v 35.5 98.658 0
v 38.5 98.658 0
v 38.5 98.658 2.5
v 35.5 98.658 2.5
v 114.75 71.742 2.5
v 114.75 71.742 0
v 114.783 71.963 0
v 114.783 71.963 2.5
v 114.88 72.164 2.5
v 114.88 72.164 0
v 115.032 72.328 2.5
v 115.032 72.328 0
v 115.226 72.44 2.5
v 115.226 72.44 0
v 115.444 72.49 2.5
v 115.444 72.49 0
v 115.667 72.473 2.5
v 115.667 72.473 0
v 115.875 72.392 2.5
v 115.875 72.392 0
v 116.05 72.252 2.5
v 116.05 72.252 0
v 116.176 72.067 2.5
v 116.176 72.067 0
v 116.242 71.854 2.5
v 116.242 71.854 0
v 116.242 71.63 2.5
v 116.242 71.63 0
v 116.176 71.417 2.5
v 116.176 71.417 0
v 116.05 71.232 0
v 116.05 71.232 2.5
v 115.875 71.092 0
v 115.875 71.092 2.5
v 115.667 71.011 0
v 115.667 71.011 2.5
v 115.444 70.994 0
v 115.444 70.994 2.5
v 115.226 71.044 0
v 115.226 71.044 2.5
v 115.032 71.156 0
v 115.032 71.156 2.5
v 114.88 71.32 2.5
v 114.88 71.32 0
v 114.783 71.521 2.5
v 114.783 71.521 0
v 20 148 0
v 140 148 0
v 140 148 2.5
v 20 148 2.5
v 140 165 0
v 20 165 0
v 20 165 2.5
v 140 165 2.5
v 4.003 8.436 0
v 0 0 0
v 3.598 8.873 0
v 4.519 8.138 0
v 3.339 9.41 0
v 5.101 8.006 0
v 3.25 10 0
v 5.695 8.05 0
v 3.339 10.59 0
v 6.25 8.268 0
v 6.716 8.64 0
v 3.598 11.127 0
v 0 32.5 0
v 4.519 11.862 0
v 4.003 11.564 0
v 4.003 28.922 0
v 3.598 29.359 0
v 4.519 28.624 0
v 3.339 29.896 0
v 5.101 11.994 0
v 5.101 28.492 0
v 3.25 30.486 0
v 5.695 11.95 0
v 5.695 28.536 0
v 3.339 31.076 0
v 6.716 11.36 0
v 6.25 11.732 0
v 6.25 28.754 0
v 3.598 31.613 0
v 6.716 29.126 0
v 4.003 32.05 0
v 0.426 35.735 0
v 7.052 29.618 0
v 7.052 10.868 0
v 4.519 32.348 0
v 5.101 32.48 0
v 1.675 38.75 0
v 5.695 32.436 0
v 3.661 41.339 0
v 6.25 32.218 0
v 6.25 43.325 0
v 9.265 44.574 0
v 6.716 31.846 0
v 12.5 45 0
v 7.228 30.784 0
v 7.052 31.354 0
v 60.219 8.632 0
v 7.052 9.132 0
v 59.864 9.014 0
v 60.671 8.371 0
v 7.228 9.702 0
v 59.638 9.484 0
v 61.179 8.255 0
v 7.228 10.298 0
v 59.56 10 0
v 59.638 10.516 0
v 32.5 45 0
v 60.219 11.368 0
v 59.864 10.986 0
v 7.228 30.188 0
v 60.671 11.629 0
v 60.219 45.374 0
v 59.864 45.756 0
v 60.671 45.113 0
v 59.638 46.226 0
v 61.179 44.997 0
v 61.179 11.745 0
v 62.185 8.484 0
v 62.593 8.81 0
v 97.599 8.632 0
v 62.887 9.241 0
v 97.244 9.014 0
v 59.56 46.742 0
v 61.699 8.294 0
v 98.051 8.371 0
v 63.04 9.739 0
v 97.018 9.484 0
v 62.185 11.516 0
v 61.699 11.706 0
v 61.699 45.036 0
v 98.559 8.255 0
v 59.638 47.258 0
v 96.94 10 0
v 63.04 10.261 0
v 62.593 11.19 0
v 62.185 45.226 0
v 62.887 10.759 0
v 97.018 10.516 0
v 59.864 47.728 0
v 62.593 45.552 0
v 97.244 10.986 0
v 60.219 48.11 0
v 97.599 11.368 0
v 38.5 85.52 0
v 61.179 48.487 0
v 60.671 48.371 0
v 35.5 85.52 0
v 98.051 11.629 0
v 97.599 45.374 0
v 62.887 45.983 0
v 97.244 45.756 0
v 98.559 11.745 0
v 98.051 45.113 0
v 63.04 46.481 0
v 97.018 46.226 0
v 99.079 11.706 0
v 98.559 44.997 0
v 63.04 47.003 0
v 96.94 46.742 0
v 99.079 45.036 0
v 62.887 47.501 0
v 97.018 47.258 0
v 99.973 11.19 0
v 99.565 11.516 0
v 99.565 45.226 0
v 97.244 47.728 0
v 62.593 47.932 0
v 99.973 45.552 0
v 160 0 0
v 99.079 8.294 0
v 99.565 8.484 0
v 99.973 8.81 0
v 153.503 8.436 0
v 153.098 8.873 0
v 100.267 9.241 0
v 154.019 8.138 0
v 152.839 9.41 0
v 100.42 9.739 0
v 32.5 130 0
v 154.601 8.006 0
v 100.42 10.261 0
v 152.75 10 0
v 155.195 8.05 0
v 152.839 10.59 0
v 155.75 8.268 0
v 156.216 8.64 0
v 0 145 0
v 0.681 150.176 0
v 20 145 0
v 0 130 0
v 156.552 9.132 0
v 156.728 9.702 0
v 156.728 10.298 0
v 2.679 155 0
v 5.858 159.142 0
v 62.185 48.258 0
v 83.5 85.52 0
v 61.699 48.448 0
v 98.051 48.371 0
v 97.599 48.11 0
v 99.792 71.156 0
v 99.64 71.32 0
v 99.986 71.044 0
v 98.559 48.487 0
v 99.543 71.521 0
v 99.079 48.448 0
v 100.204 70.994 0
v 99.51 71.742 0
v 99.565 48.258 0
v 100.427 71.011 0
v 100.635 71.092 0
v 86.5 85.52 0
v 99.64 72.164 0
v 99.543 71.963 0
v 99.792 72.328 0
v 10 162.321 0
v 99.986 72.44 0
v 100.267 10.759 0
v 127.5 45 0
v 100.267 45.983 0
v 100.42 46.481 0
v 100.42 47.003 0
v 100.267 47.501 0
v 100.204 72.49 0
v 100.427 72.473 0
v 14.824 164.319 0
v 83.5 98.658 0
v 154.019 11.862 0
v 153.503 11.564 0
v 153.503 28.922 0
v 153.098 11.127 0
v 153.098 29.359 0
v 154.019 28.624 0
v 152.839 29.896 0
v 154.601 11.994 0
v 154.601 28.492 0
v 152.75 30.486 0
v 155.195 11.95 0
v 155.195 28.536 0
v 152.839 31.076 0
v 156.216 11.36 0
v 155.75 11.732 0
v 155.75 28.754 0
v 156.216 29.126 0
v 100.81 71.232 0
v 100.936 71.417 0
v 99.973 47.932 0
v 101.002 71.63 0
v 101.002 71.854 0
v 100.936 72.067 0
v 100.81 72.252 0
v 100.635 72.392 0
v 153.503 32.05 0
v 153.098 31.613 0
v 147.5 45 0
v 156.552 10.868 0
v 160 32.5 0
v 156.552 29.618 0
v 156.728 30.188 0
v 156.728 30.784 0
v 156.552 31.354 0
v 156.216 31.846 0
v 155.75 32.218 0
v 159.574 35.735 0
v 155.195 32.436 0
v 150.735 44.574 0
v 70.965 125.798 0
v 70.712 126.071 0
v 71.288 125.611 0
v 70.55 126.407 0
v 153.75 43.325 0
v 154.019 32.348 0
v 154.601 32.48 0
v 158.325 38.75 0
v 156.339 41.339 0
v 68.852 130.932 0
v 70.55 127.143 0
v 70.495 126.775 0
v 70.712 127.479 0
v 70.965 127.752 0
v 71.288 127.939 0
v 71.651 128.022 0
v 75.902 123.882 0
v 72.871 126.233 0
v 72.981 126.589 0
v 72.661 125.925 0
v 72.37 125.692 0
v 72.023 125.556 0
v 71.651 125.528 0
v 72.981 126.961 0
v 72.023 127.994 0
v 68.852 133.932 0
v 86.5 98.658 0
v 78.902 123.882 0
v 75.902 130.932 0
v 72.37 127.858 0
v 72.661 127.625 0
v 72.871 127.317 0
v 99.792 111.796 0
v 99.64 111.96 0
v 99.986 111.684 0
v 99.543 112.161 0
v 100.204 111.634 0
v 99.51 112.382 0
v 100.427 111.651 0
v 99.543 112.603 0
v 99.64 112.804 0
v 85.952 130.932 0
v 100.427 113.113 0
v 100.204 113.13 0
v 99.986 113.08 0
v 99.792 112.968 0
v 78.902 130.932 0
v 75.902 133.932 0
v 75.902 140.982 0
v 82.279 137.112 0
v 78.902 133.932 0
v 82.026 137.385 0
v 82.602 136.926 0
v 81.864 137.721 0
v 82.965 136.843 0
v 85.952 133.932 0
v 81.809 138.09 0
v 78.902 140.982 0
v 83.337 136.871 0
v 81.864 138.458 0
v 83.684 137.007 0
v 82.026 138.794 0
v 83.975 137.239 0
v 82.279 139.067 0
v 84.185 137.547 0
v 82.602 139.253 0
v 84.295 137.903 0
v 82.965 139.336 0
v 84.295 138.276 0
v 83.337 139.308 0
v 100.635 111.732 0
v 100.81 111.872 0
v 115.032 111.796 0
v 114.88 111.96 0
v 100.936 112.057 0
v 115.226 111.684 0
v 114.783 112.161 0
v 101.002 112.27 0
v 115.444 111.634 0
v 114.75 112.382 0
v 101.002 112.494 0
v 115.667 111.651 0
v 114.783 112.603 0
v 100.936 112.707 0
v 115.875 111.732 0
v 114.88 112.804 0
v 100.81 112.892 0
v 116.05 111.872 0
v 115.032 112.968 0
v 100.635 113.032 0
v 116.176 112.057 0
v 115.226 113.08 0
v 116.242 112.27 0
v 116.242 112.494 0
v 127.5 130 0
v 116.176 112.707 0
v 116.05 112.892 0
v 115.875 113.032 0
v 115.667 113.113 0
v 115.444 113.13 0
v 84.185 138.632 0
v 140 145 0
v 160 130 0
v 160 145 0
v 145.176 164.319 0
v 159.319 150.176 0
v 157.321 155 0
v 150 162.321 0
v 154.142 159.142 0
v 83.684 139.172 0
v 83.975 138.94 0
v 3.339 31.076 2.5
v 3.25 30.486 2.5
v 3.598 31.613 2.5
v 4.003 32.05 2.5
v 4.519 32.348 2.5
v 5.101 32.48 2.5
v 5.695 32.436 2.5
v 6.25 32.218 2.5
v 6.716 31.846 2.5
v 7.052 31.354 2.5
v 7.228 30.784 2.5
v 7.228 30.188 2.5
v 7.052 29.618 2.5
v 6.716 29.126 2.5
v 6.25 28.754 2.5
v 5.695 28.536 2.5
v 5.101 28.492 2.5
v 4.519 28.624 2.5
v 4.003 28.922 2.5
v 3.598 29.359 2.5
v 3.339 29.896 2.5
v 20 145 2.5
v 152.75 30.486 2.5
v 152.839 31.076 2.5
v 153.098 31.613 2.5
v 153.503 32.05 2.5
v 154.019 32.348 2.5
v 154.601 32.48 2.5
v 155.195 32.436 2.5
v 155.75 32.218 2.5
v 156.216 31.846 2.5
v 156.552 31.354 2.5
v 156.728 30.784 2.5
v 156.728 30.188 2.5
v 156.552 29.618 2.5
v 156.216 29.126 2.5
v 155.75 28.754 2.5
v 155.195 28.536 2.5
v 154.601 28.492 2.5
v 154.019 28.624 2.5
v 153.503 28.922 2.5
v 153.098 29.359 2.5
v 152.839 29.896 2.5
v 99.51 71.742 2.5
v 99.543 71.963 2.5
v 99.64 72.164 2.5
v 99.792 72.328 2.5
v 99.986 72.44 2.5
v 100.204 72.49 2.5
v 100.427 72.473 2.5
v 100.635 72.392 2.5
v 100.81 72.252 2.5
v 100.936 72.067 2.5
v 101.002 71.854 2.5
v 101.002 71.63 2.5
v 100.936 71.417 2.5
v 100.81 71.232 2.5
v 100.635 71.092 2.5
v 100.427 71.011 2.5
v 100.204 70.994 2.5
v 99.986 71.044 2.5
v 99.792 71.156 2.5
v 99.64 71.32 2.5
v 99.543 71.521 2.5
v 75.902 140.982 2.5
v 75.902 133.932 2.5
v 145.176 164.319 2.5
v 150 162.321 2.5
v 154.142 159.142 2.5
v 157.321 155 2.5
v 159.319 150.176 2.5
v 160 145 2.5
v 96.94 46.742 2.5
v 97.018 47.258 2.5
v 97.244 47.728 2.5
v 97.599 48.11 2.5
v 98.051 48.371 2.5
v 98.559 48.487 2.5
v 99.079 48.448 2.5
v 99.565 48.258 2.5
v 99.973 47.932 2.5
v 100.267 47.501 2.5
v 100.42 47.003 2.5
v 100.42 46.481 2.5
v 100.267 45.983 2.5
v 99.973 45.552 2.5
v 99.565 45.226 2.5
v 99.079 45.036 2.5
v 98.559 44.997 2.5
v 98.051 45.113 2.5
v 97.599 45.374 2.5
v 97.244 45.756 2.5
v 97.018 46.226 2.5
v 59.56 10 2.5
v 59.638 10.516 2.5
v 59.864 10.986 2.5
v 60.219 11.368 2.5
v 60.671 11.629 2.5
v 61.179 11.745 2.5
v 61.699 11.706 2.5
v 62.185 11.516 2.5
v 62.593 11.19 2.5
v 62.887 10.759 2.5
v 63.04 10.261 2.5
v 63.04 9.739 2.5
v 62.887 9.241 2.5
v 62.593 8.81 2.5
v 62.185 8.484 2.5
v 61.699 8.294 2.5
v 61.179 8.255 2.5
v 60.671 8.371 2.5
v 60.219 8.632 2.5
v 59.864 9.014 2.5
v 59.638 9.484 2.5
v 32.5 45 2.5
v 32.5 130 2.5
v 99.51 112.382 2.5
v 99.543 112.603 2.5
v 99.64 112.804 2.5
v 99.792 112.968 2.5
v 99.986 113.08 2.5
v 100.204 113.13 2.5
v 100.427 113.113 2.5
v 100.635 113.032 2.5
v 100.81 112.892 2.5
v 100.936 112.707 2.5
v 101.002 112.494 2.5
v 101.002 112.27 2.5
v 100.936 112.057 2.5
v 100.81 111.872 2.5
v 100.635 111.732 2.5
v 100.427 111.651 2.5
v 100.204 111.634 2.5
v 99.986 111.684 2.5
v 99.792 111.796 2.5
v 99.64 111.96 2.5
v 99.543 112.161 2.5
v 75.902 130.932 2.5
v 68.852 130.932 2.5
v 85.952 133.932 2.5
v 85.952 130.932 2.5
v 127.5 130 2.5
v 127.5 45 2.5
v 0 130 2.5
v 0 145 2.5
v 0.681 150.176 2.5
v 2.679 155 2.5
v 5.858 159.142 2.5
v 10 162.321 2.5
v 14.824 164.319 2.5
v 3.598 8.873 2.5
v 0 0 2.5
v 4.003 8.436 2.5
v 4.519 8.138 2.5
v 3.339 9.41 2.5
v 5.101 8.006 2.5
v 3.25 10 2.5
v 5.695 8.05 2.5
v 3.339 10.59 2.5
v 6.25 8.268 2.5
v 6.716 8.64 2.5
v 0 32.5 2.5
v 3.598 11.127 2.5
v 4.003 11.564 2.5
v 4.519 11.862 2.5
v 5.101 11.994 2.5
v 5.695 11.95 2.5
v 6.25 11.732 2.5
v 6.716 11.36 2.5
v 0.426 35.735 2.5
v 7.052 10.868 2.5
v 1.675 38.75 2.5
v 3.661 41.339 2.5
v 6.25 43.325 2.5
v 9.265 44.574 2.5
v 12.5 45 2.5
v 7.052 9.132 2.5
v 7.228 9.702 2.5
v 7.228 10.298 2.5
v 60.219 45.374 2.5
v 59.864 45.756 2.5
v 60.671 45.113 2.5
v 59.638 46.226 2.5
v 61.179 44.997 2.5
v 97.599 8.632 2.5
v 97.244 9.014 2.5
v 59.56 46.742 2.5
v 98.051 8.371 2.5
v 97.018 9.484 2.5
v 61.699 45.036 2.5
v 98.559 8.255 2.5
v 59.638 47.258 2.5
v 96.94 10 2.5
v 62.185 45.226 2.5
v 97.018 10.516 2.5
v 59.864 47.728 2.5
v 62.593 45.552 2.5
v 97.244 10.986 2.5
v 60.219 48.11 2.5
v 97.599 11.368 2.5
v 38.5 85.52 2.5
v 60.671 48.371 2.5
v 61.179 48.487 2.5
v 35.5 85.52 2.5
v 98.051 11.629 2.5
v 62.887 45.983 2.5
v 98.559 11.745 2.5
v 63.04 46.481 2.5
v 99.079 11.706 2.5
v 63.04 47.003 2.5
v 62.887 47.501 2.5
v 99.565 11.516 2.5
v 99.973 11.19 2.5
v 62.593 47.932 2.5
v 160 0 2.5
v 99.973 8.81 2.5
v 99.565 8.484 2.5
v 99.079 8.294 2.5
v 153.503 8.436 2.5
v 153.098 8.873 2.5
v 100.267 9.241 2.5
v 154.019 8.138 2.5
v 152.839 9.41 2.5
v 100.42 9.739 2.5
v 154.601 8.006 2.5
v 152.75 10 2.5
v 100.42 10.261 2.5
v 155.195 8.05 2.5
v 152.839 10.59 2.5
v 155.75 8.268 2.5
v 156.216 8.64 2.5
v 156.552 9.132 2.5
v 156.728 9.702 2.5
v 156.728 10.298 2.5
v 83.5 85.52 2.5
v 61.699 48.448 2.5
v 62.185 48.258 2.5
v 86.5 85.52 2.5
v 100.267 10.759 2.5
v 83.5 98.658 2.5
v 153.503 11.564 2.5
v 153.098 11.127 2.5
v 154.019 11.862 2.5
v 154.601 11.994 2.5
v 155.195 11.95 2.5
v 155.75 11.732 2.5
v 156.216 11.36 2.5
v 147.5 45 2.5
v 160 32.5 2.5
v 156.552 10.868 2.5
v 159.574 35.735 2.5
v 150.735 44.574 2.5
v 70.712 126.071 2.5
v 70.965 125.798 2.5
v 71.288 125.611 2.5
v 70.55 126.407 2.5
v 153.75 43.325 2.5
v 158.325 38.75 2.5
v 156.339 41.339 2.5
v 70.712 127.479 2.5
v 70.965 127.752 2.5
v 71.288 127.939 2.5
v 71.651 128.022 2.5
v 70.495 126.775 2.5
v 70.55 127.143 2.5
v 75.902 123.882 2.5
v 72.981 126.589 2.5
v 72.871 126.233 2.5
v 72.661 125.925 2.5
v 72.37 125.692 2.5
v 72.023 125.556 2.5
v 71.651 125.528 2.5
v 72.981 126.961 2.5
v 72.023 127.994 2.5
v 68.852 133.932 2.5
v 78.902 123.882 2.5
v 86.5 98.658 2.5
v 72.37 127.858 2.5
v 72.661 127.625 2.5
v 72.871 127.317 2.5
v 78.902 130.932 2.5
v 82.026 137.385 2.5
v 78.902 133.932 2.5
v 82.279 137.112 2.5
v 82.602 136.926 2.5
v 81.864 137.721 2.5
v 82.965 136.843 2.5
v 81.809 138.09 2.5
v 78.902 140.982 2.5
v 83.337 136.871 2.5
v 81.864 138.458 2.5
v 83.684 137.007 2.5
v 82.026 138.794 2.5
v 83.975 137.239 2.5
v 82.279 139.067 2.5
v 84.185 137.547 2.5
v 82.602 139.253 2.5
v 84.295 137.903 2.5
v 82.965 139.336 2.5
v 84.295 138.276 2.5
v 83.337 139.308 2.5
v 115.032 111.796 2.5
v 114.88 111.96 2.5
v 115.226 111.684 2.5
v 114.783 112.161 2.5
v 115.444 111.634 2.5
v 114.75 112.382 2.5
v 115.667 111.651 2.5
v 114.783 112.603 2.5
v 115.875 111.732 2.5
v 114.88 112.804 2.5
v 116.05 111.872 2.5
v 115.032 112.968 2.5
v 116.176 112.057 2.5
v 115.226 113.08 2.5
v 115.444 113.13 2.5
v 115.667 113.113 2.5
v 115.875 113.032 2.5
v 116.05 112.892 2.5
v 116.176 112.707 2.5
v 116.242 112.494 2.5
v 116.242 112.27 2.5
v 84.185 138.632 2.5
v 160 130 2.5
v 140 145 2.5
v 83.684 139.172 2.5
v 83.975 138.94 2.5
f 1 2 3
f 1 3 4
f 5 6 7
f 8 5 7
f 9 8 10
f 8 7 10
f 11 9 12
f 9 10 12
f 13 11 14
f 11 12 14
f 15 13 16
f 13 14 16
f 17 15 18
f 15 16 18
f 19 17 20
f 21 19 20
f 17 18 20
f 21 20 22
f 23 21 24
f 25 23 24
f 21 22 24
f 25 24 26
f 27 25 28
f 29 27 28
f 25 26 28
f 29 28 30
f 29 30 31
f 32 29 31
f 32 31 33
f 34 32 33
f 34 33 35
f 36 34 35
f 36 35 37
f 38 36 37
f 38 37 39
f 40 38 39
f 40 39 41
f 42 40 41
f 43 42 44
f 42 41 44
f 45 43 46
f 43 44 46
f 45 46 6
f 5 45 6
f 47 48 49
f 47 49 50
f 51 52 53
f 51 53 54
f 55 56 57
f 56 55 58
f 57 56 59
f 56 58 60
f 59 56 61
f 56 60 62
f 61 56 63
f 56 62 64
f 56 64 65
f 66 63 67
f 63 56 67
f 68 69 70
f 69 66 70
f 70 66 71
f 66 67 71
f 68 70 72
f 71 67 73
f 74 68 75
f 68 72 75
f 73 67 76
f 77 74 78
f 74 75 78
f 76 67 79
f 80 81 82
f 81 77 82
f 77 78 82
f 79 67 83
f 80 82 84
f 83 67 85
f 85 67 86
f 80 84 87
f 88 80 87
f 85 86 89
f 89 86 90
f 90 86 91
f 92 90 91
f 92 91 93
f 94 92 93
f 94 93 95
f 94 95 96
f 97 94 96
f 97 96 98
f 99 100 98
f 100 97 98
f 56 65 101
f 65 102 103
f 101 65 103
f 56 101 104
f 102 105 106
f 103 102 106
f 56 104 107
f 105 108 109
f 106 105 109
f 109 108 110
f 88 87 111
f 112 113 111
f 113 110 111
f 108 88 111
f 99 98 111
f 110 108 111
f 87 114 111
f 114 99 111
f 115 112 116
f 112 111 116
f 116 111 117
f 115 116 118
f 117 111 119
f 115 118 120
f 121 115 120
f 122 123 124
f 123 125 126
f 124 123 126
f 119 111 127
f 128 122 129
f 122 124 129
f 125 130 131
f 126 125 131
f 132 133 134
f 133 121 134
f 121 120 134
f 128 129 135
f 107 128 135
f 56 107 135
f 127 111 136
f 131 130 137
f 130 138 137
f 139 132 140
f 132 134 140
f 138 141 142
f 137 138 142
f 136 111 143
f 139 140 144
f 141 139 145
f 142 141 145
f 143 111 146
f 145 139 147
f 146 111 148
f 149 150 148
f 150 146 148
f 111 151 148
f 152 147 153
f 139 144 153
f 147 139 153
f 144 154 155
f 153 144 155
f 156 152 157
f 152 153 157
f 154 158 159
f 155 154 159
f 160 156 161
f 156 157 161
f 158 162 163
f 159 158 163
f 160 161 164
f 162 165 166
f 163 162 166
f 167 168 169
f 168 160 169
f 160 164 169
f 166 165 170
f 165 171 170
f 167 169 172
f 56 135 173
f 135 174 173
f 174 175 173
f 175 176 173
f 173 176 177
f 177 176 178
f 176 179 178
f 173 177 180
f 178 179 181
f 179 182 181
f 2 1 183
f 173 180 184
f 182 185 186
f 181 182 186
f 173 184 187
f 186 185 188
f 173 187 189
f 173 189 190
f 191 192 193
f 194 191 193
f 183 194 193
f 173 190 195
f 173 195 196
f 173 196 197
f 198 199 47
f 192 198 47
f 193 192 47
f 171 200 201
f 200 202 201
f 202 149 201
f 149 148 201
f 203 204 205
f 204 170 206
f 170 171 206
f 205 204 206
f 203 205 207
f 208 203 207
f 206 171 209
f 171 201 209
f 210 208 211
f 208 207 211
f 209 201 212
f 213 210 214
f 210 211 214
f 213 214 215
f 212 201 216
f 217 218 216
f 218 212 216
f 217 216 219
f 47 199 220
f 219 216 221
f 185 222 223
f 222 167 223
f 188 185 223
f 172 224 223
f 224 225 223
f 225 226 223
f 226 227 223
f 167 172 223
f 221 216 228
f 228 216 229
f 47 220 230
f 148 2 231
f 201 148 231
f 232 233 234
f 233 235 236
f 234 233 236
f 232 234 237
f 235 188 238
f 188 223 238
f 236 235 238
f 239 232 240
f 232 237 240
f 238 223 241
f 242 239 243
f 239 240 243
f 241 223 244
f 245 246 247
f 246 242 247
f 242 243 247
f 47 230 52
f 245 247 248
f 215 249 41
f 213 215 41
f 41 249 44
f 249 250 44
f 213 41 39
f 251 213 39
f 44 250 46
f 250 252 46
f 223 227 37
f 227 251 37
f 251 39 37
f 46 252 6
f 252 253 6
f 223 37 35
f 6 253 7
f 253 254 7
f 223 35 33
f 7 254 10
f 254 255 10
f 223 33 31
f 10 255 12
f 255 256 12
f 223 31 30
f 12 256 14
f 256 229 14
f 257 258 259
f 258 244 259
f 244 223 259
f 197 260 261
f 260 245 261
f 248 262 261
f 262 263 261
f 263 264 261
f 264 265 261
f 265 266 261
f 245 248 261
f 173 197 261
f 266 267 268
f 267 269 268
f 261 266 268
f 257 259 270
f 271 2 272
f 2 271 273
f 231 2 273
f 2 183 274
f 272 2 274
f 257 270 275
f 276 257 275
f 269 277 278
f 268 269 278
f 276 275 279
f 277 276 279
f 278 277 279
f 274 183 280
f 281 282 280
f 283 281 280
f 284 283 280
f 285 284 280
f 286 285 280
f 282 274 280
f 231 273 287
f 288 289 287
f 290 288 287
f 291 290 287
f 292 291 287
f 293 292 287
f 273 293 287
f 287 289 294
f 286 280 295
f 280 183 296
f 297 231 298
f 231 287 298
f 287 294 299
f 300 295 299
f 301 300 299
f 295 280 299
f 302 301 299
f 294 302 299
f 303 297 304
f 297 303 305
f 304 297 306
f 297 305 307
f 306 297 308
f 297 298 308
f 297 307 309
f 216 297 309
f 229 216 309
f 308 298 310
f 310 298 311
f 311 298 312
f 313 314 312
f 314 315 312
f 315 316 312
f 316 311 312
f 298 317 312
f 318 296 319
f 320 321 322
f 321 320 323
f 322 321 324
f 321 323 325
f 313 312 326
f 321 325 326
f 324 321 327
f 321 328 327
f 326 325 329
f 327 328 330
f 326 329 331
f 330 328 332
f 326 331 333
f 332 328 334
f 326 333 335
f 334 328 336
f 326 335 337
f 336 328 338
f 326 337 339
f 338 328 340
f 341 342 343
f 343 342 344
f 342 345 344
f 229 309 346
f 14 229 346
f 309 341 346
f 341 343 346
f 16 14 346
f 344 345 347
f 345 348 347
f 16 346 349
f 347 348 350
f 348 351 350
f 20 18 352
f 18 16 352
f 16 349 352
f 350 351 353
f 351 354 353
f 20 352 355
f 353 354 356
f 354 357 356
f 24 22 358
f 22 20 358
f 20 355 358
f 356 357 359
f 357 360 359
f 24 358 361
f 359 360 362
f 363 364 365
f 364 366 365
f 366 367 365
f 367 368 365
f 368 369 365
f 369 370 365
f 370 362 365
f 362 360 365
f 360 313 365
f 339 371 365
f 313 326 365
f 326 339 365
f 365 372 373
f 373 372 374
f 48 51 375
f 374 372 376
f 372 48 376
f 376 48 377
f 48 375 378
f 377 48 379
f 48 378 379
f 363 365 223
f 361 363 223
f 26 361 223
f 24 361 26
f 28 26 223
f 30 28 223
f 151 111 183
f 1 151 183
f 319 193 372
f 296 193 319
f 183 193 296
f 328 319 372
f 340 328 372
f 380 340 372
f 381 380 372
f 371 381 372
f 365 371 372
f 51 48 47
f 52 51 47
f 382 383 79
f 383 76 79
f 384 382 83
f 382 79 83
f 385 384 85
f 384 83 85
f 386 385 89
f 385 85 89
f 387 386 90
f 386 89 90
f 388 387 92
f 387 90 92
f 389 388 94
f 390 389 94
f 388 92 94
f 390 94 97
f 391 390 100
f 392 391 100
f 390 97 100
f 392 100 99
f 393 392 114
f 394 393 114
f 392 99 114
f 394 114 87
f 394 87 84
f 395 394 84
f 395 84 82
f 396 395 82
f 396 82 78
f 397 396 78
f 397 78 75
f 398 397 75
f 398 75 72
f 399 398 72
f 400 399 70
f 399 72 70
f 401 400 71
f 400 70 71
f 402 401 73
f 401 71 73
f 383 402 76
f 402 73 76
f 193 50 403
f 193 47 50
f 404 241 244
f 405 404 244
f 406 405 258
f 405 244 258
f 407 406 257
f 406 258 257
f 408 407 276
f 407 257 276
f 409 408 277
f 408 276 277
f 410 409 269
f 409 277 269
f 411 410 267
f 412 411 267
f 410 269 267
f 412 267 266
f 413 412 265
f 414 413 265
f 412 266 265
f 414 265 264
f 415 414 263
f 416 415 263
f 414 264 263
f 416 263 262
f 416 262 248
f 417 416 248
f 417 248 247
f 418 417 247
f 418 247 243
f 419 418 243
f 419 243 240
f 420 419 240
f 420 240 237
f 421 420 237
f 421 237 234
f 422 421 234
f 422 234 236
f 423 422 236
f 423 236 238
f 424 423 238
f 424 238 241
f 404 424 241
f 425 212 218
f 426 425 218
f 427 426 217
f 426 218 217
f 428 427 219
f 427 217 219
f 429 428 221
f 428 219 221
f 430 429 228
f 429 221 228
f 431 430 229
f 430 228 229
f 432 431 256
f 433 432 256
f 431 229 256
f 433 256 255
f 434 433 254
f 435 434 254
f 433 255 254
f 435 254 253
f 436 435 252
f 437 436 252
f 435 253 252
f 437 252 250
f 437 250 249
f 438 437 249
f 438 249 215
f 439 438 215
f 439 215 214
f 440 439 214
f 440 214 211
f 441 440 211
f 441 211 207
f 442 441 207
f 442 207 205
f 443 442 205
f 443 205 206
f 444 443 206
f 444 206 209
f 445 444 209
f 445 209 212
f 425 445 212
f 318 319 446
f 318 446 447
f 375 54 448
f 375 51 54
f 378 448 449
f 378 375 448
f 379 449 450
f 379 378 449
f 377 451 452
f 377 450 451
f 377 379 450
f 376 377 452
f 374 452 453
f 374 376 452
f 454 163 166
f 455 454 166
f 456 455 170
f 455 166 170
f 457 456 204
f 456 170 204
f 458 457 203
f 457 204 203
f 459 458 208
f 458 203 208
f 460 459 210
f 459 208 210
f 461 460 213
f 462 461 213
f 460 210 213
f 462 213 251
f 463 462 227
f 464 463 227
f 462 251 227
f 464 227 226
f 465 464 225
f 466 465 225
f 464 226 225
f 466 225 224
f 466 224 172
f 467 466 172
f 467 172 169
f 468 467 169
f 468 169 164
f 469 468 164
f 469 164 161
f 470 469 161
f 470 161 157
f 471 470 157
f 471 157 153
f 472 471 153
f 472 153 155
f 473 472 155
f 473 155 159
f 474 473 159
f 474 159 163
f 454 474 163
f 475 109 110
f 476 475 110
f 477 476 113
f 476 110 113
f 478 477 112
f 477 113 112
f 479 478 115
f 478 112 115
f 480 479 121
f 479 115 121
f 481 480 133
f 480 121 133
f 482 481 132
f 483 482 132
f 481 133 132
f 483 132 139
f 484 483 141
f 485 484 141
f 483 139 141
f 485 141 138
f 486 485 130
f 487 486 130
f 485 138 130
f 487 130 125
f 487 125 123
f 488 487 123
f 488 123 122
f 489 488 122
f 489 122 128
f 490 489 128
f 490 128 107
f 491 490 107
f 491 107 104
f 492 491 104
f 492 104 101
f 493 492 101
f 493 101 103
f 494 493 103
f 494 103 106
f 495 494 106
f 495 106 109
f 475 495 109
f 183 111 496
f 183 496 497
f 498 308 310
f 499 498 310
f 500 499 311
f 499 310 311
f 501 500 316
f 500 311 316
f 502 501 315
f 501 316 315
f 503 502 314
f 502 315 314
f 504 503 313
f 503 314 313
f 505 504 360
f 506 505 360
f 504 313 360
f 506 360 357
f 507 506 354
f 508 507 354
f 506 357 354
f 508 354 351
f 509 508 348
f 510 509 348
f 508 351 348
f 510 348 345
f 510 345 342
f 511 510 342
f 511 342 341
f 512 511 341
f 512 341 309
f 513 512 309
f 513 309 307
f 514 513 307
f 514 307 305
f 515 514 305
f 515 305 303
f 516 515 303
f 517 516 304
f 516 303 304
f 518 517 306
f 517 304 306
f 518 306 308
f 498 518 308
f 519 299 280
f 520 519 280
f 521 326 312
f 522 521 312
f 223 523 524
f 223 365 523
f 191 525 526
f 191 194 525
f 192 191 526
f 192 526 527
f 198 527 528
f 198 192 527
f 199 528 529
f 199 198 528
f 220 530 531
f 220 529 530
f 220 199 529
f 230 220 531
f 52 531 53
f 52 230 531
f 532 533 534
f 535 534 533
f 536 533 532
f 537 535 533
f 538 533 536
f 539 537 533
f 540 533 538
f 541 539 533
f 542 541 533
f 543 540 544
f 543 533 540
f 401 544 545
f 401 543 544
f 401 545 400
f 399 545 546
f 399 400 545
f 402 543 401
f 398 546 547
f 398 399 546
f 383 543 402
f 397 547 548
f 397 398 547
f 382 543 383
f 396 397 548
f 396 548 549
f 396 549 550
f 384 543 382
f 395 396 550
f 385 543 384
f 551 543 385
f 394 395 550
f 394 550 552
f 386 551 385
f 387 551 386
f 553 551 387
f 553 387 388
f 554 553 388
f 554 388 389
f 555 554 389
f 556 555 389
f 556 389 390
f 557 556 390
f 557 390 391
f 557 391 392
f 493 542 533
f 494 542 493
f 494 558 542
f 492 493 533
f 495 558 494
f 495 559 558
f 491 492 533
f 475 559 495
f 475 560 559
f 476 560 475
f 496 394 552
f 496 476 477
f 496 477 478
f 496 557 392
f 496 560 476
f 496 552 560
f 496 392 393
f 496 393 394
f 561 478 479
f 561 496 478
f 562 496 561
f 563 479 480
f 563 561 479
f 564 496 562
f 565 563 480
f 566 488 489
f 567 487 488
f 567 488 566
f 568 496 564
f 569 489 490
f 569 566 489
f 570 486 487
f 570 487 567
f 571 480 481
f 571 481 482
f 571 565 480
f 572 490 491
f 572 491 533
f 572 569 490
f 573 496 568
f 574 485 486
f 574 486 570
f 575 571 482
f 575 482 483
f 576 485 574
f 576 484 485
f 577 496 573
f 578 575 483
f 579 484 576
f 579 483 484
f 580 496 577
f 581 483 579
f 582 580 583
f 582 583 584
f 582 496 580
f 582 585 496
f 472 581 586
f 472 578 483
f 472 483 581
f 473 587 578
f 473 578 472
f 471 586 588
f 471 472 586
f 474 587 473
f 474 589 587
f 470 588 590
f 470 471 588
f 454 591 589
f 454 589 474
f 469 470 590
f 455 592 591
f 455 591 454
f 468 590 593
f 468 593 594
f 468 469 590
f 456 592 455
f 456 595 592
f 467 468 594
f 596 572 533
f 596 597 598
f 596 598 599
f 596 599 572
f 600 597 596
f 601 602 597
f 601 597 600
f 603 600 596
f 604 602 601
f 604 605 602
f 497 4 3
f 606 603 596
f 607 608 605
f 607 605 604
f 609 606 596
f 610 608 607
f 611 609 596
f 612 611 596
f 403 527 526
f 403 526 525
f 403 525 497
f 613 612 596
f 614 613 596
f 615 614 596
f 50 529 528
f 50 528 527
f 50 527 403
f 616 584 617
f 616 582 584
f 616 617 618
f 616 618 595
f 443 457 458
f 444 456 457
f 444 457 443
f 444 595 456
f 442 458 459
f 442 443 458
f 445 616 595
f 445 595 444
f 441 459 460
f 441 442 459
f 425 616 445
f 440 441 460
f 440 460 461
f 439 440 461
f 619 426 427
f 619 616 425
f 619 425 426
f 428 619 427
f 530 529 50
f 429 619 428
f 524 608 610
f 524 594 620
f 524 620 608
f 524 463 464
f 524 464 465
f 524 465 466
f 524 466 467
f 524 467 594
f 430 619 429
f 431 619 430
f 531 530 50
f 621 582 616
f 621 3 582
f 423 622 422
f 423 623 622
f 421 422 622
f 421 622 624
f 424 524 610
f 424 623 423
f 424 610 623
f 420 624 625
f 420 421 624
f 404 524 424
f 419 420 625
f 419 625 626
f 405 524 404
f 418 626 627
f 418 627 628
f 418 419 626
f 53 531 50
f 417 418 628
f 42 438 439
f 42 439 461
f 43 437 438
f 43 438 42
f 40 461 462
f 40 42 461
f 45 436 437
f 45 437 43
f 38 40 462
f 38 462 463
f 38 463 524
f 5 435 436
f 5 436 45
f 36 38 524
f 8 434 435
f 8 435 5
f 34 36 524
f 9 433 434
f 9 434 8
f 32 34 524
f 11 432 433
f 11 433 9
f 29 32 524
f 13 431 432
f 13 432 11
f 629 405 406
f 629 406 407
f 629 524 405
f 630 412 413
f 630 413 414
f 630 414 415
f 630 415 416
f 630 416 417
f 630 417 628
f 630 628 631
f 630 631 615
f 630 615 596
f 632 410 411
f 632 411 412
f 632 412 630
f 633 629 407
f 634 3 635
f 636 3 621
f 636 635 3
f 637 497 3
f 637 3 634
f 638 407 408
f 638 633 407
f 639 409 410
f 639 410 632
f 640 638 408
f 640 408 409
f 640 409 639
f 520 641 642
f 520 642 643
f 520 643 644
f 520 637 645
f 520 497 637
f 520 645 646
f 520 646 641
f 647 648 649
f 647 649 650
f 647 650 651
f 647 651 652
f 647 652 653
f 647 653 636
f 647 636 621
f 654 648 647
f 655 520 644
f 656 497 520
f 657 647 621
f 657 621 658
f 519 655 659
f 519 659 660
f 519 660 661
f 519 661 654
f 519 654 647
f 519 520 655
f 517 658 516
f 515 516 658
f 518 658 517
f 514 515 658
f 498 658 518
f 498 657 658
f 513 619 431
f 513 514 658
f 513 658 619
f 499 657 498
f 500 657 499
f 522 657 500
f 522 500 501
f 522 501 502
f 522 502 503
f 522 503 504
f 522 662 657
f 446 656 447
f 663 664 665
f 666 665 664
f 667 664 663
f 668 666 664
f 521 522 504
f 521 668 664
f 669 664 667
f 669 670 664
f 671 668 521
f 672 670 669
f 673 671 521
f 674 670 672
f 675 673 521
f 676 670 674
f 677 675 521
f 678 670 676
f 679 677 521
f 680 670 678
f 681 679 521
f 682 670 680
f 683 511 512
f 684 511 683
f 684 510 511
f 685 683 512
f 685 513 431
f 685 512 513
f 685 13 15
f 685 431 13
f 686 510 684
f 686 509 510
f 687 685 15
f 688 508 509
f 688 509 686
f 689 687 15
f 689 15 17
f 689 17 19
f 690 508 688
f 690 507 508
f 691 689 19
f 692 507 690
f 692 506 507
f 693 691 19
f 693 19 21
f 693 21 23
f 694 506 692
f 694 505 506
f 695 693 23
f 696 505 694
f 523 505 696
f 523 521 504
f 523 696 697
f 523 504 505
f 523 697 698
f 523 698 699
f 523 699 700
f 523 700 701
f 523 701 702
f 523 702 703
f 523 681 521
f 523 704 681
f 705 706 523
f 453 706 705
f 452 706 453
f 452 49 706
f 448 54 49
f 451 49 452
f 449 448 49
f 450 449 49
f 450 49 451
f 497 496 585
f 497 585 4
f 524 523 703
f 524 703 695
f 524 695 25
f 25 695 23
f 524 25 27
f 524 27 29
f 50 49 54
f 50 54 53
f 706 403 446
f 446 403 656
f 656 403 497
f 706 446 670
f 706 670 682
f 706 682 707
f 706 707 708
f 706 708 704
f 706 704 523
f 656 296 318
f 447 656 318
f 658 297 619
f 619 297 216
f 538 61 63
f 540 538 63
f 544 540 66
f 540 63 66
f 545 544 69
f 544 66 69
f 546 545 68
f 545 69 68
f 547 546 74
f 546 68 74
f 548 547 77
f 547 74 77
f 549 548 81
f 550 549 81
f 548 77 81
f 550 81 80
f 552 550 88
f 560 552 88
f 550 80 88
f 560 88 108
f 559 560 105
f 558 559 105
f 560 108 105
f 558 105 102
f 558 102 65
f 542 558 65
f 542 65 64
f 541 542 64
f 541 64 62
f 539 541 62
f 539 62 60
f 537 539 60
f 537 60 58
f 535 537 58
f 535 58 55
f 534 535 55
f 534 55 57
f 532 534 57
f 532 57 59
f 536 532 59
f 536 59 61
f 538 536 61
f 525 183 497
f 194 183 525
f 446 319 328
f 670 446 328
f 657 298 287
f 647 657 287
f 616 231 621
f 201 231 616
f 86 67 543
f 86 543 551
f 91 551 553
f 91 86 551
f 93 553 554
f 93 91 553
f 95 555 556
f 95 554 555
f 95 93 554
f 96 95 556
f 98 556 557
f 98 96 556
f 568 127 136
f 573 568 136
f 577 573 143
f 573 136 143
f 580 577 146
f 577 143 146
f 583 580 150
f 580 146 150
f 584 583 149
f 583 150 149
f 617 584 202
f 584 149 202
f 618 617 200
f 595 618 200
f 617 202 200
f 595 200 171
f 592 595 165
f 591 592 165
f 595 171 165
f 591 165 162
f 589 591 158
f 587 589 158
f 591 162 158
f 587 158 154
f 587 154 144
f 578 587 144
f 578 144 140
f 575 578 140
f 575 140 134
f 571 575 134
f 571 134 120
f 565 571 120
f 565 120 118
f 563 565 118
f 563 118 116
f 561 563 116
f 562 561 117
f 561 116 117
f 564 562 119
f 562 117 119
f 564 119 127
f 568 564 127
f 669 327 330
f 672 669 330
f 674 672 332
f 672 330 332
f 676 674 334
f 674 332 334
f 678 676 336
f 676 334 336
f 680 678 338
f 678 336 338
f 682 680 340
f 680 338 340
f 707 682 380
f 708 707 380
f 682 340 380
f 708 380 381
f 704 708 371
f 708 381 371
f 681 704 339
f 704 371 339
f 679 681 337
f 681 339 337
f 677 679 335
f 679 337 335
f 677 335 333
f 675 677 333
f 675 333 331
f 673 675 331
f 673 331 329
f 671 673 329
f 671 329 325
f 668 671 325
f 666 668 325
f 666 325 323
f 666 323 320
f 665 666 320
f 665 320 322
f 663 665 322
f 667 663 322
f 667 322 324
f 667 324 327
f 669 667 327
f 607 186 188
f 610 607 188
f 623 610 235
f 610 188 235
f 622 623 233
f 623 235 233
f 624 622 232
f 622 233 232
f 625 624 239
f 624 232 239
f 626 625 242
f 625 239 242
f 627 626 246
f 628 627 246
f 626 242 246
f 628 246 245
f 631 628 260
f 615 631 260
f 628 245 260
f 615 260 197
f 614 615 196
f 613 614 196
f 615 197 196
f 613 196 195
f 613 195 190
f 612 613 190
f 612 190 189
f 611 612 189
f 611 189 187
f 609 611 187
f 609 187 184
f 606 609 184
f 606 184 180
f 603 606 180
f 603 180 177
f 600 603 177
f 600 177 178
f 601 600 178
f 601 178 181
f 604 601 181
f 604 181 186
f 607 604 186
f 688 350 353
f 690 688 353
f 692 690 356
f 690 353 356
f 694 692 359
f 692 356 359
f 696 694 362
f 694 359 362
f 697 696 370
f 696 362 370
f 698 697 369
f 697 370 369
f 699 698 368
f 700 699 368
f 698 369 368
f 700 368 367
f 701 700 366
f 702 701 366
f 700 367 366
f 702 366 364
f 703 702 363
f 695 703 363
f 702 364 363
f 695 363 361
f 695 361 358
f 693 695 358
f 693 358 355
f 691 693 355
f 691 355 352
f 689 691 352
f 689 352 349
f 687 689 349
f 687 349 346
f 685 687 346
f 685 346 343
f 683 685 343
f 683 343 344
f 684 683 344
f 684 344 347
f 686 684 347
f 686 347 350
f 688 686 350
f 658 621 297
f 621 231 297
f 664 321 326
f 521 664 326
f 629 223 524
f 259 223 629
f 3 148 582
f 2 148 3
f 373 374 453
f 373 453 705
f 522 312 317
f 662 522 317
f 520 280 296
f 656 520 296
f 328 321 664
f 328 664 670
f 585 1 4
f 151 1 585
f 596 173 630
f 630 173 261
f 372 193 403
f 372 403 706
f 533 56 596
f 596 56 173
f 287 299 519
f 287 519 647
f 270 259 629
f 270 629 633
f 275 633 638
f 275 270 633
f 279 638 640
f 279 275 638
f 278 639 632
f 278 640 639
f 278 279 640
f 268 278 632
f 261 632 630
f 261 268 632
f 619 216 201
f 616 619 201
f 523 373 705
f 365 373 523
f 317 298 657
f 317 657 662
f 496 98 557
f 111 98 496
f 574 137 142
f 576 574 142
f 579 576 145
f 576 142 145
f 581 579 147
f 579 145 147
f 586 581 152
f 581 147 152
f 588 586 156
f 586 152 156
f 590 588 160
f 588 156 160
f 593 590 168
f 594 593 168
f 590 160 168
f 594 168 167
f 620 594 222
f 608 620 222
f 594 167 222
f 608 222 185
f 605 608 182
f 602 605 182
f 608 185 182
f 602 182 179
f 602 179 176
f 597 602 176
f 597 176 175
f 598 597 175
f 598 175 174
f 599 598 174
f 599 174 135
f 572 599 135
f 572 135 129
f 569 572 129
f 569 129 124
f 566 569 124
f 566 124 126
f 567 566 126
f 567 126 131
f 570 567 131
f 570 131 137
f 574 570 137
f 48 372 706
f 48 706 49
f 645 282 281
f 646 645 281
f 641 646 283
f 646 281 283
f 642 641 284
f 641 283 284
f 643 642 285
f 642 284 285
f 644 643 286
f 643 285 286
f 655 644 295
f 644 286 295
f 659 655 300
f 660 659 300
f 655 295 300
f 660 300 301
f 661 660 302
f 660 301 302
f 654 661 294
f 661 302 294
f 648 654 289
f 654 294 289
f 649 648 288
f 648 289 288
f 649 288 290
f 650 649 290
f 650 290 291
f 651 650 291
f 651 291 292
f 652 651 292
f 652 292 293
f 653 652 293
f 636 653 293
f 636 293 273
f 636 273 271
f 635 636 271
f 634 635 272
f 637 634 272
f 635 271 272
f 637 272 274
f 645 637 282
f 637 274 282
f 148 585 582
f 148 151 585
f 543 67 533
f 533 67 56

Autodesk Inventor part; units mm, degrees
ref_plane "YZ Plane" through (0, 0, 0) normal (1, 0, 0) x (0, 1, 0)
ref_plane "XZ Plane" through (0, 0, 0) normal (0, 1, 0) x (-1, 0, 0)
ref_plane "XY Plane" through (0, 0, 0) normal (0, 0, 1) x (1, 0, 0)
sketch "Esboço1" plane through (0, 0, 0) normal (0, 0, 1) x (1, 0, 0)
  line L0 (0, 0) -> (160, 0)
  line L1 (160, 0) -> (160, 32.5)
  line L2 (0, 32.5) -> (0, 0)
  line L3 (20, 165) -> (140, 165)
  line L4 (160, 145) -> (160, 130)
  line L5 (0, 130) -> (0, 145)
  arc A0 (20, 165) -> (0, 145) centre (20, 145) ccw
  arc A1 (160, 145) -> (140, 165) centre (140, 145) ccw
  line L6 (127.5, 130) -> (127.5, 45)
  line L7 (32.5, 45) -> (32.5, 130)
  line L8 (12.5, 45) -> (32.5, 45)
  line L9 (127.5, 45) -> (147.5, 45)
  line L10 (160, 130) -> (127.5, 130)
  line L11 (32.5, 130) -> (0, 130)
  arc A2 (12.5, 45) -> (0, 32.5) centre (12.5, 32.5) ccw
  arc A3 (160, 32.5) -> (147.5, 45) centre (147.5, 32.5) ccw
  line L12 (20, 148) -> (20, 145)
  line L13 (20, 145) -> (140, 145)
  line L14 (140, 145) -> (140, 148)
  line L15 (140, 148) -> (20, 148)
  point P0 (0, 165)
  point P1 (160, 165)
  dimension "d3" = 160
  dimension "d4" = 165
  dimension "d6" = 20
  dimension "d12" = 95
  dimension "d14" = 85
  dimension "d15" = 35
  dimension "d16" = 12.5
  dimension "d17" = 12.5
  dimension "d73" = 3
  dimension "d74" = 32.5
extrude "Extrusão1" add sketch "Esboço1" along normal blind 2.5
sketch "Esboço2" plane through (0, 0, 0) normal (0, 0, -1) x (-1, 0, 0)
  line L0 (-10.5, 30.486) -> (-10.5, 10)
  line L1 (-10.5, 10) -> (0, 10)
  line L2 (0, 10) -> (0, 30.486)
  line L3 (0, 30.486) -> (-10.5, 30.486)
  line L4 (0, 32.5) -> (0, 0) projected
  line L5 (0, 0) -> (-160, 0) projected
  line L6 (-160, 30.486) -> (-160, 10)
  line L7 (-160, 10) -> (-149.5, 10)
  line L8 (-149.5, 10) -> (-149.5, 30.486)
  line L9 (-149.5, 30.486) -> (-160, 30.486)
  line L10 (-160, 0) -> (-160, 32.5) projected
  circle A0 centre (-5.25, 10) radius 2
  circle A1 centre (-154.75, 30.486) radius 2
  circle A2 centre (-154.75, 10) radius 2
  circle A3 centre (-5.25, 30.486) radius 2
  line L11 (-98.69, 46.742) -> (-98.69, 10)
  line L12 (-98.69, 10) -> (-61.31, 10)
  line L13 (-61.31, 10) -> (-61.31, 46.742)
  line L14 (-61.31, 46.742) -> (-98.69, 46.742)
  circle A4 centre (-98.69, 46.742) radius 1.75
  circle A5 centre (-61.31, 46.742) radius 1.75
  circle A6 centre (-98.69, 10) radius 1.75
  circle A7 centre (-61.31, 10) radius 1.75
  line L15 (-100.26, 112.382) -> (-115.5, 112.382)
  line L16 (-115.5, 112.382) -> (-115.5, 71.742)
  line L17 (-115.5, 71.742) -> (-100.26, 71.742)
  line L18 (-100.26, 71.742) -> (-100.26, 112.382)
  line L19 (-127.5, 45) -> (-127.5, 130) projected
  circle A8 centre (-100.26, 112.382) radius 0.75
  circle A9 centre (-115.5, 112.382) radius 0.75
  circle A10 centre (-115.5, 71.742) radius 0.75
  circle A11 centre (-100.26, 71.742) radius 0.75
  line L20 (-68.8516, 140.982) -> (-85.9516, 140.982)
  line L21 (-85.9516, 140.982) -> (-85.9516, 123.882)
  line L22 (-85.9516, 123.882) -> (-68.8516, 123.882)
  line L23 (-68.8516, 123.882) -> (-68.8516, 140.982)
  circle A12 centre (-83.0586, 138.0895) radius 1.25
  circle A13 centre (-71.7446, 126.775) radius 1.25
  line L24 (-32.5, 130) -> (-32.5, 45) projected
  line L25 (-83.5, 75.089) -> (-38.5, 75.089)
  line L26 (-38.5, 75.089) -> (-38.5, 109.089)
  line L27 (-38.5, 109.089) -> (-83.5, 109.089)
  line L28 (-83.5, 109.089) -> (-83.5, 75.089)
  line L29 (-38.5, 98.658) -> (-35.5, 98.658)
  line L30 (-35.5, 98.658) -> (-35.5, 85.52)
  line L31 (-35.5, 85.52) -> (-38.5, 85.52)
  line L32 (-83.5, 98.658) -> (-86.5, 98.658)
  line L33 (-86.5, 98.658) -> (-86.5, 85.52)
  line L34 (-86.5, 85.52) -> (-83.5, 85.52)
  line L35 (-68.8516, 133.932) -> (-75.9016, 133.932)
  line L36 (-78.9016, 133.932) -> (-85.9516, 133.932)
  line L37 (-85.9516, 130.932) -> (-78.9016, 130.932)
  line L38 (-75.9016, 130.932) -> (-68.8516, 130.932)
  line L39 (-75.9016, 140.982) -> (-75.9016, 133.932)
  line L40 (-75.9016, 130.932) -> (-75.9016, 123.882)
  line L41 (-78.9016, 123.882) -> (-78.9016, 130.932)
  line L42 (-78.9016, 133.932) -> (-78.9016, 140.982)
  dimension "d20" = 20.486
  dimension "d21" = 10.5
  dimension "d22" = 10
  dimension "d23" = 20.486
  dimension "d24" = 10.5
  dimension "d26" = 4
  dimension "d27" = 4
  dimension "d28" = 4
  dimension "d29" = 4
  dimension "d30" = 36.742
  dimension "d35" = 3.5
  dimension "d36" = 3.5
  dimension "d37" = 3.5
  dimension "d38" = 3.5
  dimension "d39" = 15.24
  dimension "d40" = 40.64
  dimension "d42" = 12
  dimension "d43" = 1.5
  dimension "d44" = 1.5
  dimension "d45" = 1.5
  dimension "d46" = 1.5
  dimension "d47" = 17.1
  dimension "d48" = 17.1
  dimension "d50" = 2.5
  dimension "d51" = 2.5
  dimension "d52" = 2.893
  dimension "d53" = 2.8925
  dimension "d54" = 2.893
  dimension "d55" = 2.893
  dimension "d56" = 36.3516
  dimension "d57" = 41.5484
  dimension "d58" = 11.5
  dimension "d59" = 45
  dimension "d60" = 34
  dimension "d64" = 6
  dimension "d65" = 3
  dimension "d66" = 10.431
  dimension "d67" = 10.431
  dimension "d68" = 3
  dimension "d79" = 3
  dimension "d80" = 3
  dimension "d81" = 7.05
  dimension "d82" = 7.05
  dimension "d83" = 28.347
  dimension "d84" = 25
  dimension "d85" = 10
  dimension "d86" = 50.81
  dimension "d87" = 50.81
  dimension "d88" = 37.38
extrude "Extrusão2" cut sketch "Esboço2" against normal through all contours A3 L3 | L3 A3 | A0 L1 | L1 A0 | A2 L7 | L7 A2 | A1 L9 | L9 A1 | L14 A4 L11 | L11 A4 L14 | A6 L12 L11 | L11 L12 A6 | A5 L13 L14 | L14 L13 A5 | A7 L13 L12 | L12 L13 A7 | A9 L16 L15 | L15 L16 A9 | A8 L18 L15 | L15 L18 A8 | A10 L17 L16 | L16 L17 A10 | A11 L17 L18 | L18 L17 A11 | L39 L35 L23 L38 L40 L22 L41 L37 L21 L36 L42 L20 | A12 | A13 | L34 L33 L32 L28 | L26 L29 L30 L31
